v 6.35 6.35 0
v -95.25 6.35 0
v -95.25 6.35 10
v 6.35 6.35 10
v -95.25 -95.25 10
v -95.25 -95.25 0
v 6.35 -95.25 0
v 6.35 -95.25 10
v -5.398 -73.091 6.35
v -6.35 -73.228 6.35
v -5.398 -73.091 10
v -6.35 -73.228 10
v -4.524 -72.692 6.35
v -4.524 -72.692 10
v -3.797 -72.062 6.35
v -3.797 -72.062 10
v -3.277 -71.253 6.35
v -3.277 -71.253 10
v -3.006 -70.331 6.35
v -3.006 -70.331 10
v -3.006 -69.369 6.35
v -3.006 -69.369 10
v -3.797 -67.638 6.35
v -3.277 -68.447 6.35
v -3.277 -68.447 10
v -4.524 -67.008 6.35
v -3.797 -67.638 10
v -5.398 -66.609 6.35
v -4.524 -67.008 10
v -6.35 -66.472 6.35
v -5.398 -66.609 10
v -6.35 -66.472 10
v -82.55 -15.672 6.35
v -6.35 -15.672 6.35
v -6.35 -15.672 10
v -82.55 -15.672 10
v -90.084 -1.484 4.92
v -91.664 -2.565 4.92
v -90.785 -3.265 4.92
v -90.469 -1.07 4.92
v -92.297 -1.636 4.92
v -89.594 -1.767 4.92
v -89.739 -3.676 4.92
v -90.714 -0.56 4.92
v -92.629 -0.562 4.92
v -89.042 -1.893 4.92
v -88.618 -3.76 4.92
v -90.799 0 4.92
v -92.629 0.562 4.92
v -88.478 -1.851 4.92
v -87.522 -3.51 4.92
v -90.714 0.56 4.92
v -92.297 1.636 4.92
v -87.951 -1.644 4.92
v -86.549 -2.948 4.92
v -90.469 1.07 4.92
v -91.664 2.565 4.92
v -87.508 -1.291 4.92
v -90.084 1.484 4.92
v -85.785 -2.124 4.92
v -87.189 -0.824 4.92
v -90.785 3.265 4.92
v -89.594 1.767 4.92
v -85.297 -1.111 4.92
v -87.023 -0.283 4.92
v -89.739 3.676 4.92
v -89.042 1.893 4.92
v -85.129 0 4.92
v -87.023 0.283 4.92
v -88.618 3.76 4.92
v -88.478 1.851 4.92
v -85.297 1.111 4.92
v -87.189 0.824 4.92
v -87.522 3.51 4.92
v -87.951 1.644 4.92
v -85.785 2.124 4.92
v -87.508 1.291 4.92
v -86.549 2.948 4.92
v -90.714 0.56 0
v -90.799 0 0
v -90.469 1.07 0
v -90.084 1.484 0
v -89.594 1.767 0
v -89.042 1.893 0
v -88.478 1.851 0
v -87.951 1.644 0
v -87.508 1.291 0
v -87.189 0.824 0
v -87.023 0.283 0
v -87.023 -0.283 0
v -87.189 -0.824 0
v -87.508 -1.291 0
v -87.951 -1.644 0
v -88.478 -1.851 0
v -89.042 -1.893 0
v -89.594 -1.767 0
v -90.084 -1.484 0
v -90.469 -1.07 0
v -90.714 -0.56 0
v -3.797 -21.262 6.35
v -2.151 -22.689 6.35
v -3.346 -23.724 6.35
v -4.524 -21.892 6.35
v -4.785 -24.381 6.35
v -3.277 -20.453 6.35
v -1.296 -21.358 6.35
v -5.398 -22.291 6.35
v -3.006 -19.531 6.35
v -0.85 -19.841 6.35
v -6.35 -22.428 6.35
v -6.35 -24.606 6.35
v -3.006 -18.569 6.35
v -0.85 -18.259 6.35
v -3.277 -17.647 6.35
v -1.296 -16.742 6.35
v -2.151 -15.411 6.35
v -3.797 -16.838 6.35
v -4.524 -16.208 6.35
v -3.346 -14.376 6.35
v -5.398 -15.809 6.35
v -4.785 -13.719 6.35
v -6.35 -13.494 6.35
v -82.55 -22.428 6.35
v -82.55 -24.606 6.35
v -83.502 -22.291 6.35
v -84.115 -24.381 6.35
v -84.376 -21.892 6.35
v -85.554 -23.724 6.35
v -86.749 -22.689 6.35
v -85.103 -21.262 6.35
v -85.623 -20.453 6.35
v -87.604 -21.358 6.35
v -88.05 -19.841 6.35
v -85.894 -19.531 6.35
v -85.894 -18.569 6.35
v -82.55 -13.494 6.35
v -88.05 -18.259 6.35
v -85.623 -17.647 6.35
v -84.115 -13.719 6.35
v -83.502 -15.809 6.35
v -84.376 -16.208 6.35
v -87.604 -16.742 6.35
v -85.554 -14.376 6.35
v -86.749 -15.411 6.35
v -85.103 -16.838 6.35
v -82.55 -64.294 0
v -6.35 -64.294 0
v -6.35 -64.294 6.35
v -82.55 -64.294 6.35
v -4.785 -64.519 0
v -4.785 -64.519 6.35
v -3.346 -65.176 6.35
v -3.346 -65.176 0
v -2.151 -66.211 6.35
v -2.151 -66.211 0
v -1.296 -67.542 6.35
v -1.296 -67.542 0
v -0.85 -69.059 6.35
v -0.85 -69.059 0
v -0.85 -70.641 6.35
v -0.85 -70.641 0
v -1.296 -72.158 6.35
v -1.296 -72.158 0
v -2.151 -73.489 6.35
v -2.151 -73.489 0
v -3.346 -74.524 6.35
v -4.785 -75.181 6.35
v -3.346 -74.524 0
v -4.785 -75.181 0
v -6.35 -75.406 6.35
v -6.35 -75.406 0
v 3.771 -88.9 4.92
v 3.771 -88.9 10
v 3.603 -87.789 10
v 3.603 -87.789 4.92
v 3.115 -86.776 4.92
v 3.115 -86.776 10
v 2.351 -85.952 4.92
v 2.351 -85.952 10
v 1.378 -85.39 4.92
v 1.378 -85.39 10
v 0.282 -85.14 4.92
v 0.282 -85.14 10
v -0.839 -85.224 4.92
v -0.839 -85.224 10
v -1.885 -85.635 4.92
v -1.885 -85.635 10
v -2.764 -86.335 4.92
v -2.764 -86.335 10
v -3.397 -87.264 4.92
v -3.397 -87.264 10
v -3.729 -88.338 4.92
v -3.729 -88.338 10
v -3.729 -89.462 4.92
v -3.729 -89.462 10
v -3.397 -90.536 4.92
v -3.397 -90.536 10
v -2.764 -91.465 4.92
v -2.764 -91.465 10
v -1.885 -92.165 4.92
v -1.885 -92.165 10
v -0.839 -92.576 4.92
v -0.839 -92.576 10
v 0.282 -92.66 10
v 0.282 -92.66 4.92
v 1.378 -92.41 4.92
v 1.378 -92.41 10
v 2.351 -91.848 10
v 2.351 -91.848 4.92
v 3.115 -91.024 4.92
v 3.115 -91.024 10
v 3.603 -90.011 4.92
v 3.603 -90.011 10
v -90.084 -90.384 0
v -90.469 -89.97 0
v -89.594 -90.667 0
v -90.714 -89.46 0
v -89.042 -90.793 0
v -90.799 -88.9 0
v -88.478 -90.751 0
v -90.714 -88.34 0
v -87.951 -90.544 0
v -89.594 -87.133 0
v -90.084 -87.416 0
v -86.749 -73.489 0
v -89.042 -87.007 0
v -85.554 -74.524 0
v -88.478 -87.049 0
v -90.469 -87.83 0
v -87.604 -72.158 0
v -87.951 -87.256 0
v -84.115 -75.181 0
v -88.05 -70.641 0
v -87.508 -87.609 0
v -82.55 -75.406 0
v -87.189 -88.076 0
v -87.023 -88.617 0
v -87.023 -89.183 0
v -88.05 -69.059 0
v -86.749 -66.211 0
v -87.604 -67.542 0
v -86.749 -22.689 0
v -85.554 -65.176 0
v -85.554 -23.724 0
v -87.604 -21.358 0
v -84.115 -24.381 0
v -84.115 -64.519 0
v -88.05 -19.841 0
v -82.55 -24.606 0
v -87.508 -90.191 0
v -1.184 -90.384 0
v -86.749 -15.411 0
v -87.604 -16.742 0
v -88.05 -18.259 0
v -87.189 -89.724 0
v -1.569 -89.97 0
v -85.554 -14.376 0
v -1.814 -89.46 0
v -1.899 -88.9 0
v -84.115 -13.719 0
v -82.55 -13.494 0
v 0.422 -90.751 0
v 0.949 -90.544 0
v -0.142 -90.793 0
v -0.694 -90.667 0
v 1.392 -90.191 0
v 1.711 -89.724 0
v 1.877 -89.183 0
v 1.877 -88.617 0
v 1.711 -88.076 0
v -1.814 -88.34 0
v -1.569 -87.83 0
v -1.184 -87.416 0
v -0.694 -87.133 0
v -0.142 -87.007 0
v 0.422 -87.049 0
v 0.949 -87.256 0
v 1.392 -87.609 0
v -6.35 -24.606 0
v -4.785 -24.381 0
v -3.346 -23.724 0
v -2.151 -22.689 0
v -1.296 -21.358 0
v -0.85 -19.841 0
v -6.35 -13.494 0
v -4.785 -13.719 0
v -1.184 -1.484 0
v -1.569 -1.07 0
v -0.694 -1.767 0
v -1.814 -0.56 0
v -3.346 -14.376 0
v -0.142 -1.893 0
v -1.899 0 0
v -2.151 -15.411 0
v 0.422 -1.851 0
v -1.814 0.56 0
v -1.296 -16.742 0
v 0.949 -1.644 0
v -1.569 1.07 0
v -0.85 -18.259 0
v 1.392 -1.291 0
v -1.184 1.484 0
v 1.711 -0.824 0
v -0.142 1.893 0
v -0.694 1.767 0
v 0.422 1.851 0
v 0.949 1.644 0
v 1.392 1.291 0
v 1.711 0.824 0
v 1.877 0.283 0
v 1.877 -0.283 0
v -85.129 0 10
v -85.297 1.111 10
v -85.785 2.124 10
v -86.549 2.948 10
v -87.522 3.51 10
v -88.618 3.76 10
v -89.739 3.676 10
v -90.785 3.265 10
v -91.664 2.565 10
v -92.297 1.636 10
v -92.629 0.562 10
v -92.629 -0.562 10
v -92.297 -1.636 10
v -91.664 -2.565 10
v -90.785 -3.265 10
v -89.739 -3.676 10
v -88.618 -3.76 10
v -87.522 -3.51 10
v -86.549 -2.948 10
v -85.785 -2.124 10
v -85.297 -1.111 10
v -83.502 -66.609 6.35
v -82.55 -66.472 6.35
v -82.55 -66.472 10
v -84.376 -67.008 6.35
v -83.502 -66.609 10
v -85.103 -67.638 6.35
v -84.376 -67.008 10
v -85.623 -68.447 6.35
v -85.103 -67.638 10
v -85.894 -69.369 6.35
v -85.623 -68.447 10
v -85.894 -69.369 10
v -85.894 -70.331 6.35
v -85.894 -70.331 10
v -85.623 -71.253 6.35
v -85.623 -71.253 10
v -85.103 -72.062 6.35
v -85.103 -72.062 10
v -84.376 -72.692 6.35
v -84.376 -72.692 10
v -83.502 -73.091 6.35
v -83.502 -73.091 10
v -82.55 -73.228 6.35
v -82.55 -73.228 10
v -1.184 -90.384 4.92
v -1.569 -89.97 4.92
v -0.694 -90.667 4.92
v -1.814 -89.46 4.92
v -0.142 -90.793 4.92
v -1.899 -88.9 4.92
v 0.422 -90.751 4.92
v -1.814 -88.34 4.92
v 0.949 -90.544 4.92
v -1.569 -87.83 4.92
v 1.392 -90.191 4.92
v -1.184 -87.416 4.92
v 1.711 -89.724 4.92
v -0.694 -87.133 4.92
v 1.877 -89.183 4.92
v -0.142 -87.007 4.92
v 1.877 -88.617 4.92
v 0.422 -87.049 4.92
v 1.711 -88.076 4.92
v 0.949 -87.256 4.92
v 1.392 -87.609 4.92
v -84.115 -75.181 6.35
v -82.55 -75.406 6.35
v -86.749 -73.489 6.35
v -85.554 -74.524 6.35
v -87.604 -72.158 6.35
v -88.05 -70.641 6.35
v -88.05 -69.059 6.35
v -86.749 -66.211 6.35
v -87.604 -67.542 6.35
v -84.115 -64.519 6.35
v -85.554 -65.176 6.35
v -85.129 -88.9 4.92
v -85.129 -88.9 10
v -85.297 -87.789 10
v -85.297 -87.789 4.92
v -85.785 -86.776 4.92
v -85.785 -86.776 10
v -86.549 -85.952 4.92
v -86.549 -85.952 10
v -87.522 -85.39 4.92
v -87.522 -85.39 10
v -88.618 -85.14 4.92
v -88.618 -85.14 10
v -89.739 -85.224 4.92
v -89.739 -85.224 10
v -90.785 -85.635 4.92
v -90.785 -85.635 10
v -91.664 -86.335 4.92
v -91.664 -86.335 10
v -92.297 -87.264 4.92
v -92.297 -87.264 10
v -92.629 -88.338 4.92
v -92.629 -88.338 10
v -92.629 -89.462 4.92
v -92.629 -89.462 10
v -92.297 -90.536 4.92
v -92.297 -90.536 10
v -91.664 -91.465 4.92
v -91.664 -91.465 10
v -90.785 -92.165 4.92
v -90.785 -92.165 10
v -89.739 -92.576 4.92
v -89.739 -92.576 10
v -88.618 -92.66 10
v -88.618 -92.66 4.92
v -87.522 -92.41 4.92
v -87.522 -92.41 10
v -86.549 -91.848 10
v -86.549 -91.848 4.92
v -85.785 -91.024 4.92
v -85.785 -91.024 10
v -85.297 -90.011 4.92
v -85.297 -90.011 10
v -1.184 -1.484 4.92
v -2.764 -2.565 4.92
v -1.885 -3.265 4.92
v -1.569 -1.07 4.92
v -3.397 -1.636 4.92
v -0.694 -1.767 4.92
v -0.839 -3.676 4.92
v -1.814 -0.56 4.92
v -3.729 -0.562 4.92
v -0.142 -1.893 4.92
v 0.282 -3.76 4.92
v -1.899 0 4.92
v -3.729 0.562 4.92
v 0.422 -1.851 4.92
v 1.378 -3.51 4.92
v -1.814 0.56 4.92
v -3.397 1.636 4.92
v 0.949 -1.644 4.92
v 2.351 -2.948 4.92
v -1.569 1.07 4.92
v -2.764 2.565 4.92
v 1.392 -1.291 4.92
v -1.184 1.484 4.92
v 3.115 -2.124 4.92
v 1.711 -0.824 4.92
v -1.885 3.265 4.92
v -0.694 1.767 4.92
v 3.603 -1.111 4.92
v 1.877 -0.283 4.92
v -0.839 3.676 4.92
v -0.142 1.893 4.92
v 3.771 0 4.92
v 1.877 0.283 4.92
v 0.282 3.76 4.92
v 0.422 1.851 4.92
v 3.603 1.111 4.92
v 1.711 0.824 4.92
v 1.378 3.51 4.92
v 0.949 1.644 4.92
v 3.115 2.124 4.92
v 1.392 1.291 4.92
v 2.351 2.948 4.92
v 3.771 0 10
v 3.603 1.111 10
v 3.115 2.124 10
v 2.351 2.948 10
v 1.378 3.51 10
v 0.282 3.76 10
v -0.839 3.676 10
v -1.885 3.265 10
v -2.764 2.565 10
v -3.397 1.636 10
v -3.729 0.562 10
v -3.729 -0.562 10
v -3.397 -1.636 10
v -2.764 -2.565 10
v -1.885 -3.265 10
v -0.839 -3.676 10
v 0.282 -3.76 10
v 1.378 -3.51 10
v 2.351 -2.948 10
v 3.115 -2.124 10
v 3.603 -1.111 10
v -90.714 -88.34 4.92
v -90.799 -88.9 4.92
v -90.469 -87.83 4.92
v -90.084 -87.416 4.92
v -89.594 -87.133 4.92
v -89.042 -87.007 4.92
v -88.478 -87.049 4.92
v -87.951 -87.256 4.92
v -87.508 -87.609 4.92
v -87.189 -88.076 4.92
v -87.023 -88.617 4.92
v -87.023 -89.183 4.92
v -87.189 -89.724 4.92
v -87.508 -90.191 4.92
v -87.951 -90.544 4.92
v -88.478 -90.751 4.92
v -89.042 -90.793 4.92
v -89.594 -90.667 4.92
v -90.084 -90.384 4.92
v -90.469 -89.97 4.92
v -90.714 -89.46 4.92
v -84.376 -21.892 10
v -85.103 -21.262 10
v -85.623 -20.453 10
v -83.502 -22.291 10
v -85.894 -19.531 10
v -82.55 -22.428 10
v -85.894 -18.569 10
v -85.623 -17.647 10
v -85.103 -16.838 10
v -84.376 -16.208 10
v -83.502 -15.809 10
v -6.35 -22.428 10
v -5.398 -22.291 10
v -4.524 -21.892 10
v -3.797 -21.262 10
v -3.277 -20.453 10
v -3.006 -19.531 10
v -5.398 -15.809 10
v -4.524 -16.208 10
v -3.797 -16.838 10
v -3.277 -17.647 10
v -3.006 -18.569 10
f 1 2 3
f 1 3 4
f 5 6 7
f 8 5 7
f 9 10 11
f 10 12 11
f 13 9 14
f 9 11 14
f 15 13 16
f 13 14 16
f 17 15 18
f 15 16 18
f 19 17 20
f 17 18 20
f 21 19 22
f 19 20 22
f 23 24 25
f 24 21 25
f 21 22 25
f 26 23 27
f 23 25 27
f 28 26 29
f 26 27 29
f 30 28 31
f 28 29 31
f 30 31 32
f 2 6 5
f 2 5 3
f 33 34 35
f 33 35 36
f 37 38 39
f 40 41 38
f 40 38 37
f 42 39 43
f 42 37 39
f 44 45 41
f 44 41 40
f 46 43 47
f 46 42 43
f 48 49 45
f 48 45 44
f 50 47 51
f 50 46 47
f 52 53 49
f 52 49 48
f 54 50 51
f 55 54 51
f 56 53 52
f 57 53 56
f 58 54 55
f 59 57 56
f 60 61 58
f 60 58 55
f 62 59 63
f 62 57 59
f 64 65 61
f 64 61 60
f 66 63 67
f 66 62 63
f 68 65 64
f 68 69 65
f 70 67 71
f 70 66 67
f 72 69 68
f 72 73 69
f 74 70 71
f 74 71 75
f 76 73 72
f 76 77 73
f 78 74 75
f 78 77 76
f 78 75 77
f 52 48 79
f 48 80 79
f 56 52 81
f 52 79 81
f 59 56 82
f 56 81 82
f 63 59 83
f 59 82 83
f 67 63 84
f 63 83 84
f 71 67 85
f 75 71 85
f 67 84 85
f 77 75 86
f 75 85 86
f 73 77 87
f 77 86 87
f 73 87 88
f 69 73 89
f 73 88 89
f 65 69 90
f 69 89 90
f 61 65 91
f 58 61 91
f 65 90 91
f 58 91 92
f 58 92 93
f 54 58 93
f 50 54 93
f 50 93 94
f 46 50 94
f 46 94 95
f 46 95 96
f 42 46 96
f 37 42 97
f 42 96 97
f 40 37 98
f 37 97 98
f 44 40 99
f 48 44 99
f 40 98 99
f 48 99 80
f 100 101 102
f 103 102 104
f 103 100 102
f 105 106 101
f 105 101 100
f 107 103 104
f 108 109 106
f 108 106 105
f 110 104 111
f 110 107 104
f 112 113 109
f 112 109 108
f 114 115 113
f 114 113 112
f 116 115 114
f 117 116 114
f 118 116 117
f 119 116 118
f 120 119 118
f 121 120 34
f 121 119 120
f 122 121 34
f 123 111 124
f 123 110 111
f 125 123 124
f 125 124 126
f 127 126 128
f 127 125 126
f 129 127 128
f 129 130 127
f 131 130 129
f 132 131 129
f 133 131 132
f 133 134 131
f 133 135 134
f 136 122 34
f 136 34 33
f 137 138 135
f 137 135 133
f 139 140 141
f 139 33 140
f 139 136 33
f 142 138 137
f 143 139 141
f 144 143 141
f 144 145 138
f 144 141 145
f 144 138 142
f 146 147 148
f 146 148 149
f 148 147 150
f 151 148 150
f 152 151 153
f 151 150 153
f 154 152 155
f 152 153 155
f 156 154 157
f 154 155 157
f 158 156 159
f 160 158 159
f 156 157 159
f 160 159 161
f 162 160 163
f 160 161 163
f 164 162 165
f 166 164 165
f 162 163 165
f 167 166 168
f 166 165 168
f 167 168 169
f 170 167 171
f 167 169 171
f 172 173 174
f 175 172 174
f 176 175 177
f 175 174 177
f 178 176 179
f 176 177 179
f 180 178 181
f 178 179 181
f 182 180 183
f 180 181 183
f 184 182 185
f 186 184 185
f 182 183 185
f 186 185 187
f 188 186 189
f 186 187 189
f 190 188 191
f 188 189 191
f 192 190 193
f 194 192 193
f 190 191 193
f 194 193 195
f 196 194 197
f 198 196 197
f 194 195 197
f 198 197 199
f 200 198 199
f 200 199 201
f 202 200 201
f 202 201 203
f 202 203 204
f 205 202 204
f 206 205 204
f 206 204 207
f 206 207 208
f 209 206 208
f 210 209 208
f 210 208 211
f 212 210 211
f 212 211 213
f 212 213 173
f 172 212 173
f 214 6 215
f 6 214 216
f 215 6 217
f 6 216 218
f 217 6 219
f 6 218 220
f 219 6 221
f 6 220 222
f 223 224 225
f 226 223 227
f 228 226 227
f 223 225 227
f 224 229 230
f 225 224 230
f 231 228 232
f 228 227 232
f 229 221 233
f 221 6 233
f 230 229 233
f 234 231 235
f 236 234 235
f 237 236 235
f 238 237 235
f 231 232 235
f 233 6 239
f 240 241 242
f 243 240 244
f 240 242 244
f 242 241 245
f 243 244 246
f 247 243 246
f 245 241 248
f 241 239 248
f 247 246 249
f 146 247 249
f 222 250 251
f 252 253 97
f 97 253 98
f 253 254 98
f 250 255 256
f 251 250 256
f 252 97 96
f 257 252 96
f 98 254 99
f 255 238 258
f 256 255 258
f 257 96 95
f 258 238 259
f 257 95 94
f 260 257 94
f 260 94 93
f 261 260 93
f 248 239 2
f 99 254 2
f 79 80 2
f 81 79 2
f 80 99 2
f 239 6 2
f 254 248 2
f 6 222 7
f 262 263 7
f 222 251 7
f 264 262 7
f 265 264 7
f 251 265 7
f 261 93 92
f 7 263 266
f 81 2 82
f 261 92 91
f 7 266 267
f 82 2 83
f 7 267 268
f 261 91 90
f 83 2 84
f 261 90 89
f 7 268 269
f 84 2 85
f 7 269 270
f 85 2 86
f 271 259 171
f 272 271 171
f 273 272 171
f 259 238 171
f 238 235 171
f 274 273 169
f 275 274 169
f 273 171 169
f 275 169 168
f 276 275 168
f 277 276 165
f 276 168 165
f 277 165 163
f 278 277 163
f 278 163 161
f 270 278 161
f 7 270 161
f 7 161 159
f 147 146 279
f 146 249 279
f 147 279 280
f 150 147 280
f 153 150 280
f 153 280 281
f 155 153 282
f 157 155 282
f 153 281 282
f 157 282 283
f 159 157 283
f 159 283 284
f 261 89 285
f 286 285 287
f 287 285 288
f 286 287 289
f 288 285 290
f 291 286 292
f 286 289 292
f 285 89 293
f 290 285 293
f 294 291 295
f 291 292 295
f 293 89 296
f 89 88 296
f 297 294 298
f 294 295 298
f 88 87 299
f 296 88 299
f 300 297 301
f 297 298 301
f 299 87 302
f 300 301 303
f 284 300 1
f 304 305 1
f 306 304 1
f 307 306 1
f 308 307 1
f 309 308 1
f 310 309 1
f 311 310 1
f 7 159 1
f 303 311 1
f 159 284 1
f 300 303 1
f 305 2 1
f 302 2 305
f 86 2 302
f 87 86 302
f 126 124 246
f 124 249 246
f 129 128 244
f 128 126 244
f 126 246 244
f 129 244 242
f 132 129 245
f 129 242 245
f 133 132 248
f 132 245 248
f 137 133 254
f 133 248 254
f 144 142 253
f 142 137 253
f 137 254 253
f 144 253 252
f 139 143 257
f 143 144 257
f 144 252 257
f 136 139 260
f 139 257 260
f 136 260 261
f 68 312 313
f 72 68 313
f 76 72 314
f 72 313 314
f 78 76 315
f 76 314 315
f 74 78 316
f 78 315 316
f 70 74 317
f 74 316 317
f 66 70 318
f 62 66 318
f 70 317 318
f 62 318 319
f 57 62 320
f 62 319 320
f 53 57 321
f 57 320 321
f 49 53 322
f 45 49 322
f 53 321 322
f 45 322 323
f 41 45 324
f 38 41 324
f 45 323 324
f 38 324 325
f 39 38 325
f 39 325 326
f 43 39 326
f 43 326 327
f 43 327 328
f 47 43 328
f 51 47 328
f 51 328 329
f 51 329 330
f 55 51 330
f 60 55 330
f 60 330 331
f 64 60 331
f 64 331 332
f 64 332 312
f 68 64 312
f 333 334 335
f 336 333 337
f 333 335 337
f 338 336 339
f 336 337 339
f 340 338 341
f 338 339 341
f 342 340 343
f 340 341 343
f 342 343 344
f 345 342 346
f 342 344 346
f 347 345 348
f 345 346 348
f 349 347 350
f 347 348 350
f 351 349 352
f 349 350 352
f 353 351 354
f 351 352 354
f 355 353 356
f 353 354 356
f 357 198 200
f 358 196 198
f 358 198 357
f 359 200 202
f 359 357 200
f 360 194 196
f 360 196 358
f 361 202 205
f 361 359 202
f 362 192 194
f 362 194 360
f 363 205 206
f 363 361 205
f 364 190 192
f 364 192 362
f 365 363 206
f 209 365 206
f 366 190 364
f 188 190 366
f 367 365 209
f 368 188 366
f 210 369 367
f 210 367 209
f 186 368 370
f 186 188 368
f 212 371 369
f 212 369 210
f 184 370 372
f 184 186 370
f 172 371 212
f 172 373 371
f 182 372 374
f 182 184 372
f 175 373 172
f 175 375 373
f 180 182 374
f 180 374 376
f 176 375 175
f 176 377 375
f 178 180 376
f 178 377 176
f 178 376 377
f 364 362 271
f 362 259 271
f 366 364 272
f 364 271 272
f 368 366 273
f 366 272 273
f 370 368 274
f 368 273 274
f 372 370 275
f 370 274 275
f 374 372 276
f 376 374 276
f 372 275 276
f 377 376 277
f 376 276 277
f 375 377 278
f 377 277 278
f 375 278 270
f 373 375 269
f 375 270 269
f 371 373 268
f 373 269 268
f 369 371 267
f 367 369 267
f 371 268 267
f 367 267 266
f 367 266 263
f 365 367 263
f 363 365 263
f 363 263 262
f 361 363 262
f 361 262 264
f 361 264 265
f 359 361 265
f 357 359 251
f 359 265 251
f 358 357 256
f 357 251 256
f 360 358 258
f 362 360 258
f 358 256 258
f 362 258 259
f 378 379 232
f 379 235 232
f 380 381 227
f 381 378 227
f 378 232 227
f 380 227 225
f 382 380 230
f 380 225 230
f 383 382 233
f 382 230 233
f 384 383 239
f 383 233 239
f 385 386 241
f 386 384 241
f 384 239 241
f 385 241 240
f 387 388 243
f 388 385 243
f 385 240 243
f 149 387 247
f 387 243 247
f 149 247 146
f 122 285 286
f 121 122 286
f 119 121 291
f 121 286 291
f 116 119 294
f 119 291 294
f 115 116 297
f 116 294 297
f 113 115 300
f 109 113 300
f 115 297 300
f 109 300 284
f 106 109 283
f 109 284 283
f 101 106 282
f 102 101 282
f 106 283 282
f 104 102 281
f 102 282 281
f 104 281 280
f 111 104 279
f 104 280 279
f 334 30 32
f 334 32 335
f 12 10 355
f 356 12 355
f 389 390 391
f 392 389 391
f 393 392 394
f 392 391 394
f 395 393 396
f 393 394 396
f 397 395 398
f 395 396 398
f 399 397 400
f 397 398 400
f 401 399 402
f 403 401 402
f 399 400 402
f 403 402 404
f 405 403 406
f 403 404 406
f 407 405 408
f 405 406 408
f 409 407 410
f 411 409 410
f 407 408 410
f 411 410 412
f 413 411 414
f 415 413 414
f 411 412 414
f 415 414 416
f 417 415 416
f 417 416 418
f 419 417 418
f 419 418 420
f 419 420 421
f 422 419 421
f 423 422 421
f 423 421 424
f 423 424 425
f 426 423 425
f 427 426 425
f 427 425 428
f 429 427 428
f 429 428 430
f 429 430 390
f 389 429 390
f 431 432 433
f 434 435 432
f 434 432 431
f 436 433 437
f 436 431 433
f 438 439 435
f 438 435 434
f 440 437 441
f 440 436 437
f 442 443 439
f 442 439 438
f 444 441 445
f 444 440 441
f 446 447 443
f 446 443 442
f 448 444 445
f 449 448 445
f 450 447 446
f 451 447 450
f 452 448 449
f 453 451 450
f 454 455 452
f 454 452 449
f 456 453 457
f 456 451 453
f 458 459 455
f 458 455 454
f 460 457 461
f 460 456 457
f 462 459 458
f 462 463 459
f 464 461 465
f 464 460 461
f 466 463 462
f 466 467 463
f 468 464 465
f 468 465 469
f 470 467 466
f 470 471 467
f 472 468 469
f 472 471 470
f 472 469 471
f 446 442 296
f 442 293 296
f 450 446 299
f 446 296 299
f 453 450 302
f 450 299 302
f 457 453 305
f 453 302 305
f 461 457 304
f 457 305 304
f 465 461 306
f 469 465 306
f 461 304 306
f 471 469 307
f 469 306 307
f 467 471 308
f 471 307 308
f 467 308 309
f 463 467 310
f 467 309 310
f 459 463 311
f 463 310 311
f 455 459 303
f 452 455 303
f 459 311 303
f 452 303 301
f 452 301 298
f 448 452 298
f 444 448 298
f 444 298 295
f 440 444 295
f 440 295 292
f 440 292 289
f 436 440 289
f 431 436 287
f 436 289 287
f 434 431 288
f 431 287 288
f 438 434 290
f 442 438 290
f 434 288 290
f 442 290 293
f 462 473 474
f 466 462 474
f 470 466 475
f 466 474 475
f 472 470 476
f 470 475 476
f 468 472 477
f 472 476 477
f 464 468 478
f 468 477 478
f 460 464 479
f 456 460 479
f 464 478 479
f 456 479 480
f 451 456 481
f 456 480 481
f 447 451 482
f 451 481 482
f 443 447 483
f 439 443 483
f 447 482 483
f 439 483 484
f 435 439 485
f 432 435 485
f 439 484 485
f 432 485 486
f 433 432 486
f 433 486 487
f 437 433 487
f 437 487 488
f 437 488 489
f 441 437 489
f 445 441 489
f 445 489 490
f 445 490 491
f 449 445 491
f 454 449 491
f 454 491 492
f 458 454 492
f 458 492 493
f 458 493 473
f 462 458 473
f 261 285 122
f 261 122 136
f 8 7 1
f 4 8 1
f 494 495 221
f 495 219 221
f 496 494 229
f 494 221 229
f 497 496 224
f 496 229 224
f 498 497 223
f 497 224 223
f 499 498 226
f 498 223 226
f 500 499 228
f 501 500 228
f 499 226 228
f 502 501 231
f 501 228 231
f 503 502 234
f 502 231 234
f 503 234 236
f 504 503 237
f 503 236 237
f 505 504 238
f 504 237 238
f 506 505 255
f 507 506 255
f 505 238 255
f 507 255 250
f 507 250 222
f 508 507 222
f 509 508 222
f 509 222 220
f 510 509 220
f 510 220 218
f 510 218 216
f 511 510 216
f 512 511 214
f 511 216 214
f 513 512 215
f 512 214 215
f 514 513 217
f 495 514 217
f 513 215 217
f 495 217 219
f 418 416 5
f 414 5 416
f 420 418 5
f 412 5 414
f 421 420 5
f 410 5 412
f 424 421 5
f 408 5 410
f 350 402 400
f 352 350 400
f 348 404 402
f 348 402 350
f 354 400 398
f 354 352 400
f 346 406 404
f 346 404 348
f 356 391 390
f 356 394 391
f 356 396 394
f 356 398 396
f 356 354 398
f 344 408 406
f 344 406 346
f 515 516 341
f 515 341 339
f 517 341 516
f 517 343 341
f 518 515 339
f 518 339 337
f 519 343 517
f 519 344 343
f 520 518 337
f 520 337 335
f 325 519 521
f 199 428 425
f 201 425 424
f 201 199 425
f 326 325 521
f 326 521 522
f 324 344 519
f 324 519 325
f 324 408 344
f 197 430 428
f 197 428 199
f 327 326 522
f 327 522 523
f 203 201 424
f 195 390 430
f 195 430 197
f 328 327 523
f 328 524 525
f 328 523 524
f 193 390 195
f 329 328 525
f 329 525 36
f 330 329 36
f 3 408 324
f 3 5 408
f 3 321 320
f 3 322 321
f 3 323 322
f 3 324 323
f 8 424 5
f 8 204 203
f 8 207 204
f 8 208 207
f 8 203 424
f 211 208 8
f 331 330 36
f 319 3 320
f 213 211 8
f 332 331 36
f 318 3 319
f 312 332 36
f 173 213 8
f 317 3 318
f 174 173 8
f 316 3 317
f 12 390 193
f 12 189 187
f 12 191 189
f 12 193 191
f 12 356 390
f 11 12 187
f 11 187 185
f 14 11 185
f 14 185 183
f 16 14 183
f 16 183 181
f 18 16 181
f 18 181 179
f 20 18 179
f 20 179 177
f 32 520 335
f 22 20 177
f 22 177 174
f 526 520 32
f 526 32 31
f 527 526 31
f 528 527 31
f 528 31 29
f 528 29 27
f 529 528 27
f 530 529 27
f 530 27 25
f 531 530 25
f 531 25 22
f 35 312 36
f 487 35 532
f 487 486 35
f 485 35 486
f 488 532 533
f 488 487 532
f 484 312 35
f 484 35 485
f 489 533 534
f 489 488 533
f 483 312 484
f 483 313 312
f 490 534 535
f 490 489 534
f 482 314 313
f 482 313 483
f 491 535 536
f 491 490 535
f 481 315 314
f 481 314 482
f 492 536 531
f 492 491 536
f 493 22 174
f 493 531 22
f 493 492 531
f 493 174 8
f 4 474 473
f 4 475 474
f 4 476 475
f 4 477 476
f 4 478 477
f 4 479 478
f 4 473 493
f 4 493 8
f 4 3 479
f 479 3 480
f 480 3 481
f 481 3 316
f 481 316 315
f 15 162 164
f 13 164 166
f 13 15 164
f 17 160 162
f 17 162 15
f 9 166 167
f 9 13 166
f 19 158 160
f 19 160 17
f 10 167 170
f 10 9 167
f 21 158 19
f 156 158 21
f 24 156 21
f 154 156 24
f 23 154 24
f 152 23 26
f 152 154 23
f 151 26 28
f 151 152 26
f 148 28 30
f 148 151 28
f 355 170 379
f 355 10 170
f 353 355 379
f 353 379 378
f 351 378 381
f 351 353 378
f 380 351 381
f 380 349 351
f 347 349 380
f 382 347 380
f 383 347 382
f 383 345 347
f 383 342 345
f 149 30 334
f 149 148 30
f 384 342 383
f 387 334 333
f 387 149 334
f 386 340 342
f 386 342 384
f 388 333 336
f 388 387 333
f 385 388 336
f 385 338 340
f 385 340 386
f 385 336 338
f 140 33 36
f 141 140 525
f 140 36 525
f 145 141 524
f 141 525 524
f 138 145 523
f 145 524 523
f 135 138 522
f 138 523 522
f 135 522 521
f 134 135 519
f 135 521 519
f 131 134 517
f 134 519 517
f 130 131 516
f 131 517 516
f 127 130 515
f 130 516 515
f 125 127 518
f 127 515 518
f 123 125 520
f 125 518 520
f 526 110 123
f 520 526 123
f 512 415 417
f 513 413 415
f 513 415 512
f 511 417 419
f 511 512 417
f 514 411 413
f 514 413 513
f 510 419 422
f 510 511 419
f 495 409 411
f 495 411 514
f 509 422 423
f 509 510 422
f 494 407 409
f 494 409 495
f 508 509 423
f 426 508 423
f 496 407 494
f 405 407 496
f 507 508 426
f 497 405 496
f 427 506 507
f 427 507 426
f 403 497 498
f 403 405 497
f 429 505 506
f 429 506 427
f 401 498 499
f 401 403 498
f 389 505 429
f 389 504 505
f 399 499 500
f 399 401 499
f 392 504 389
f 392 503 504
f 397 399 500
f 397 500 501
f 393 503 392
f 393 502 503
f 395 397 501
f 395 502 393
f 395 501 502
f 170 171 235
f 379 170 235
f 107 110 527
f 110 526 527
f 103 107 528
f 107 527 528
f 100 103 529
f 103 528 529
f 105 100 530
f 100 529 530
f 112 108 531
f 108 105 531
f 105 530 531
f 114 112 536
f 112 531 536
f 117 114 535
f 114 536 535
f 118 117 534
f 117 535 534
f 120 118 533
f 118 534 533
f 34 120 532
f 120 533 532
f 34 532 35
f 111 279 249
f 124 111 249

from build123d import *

# Parameters (mm, degrees)
SKETCH1_W                                        = 101.6
SKETCH1_H                                        = 101.6
BOSS_EXTRUDE1_DEPTH                              = 10
CBORE_FOR_6_BUTTON_HEAD_CAP_SCREW1_D             = 3.7973
CBORE_FOR_6_BUTTON_HEAD_CAP_SCREW1_CBORE_D       = 7.54126
CBORE_FOR_6_BUTTON_HEAD_CAP_SCREW1_CBORE_DEPTH   = 5.08
CBORE_FOR_1_4_SOCKET_HEAD_CAP_SCREW1_D           = 6.7564
CBORE_FOR_1_4_SOCKET_HEAD_CAP_SCREW1_CBORE_D     = 11.1125
CBORE_FOR_1_4_SOCKET_HEAD_CAP_SCREW1_CBORE_DEPTH = 6.35
SKETCH8_W                                        = 76.2
SKETCH8_H                                        = 11.1125
CUT_EXTRUDE1_DEPTH                               = 6.35
SKETCH10_W                                       = 76.2
SKETCH10_H                                       = 6.7564
CUT_EXTRUDE2_DEPTH                               = 135.853429693


with BuildPart() as part:
    # Sketch1 → Boss-Extrude1 (new body)
    with BuildSketch(Plane.XY):
        with Locations((-44.45, -44.45)):
            Rectangle(SKETCH1_W, SKETCH1_H)
    extrude(amount=BOSS_EXTRUDE1_DEPTH)

    # CBORE for #6 Button Head Cap Screw1 (through all)
    with Locations(Plane.XY.offset(10)):
        with Locations((0, 0), (0, -88.9), (-88.9, -88.9), (-88.9, 0)):
            CounterBoreHole(CBORE_FOR_6_BUTTON_HEAD_CAP_SCREW1_D / 2, CBORE_FOR_6_BUTTON_HEAD_CAP_SCREW1_CBORE_D / 2, CBORE_FOR_6_BUTTON_HEAD_CAP_SCREW1_CBORE_DEPTH)

    # CBORE for 1/4 Socket Head Cap Screw1 (through all)
    with Locations(Plane(origin=(0, 0, 0), x_dir=(-1, 0, 0), z_dir=(0, 0, -1))):
        with Locations((82.55, -19.05), (82.55, -69.85), (6.35, -69.85), (6.35, -19.05)):
            CounterBoreHole(CBORE_FOR_1_4_SOCKET_HEAD_CAP_SCREW1_D / 2, CBORE_FOR_1_4_SOCKET_HEAD_CAP_SCREW1_CBORE_D / 2, CBORE_FOR_1_4_SOCKET_HEAD_CAP_SCREW1_CBORE_DEPTH)

    # Sketch8 → Cut-Extrude1 (cut)
    with BuildSketch(Plane(origin=(0, 0, 0), x_dir=(-1, 0, 0), z_dir=(0, 0, -1))):
        with Locations((44.45, -19.05)):
            Rectangle(SKETCH8_W, SKETCH8_H)
        with Locations((44.45, -69.85)):
            Rectangle(SKETCH8_W, SKETCH8_H)
    extrude(amount=-CUT_EXTRUDE1_DEPTH, mode=Mode.SUBTRACT)

    # Sketch10 → Cut-Extrude2 (cut, through all)
    with BuildSketch(Plane(origin=(0, 0, 6.35), x_dir=(-1, 0, 0), z_dir=(0, 0, -1))):
        with Locations((44.45, -19.05)):
            Rectangle(SKETCH10_W, SKETCH10_H)
        with Locations((44.45, -69.85)):
            Rectangle(SKETCH10_W, SKETCH10_H)
    extrude(amount=-CUT_EXTRUDE2_DEPTH, mode=Mode.SUBTRACT)


solid = part.part
